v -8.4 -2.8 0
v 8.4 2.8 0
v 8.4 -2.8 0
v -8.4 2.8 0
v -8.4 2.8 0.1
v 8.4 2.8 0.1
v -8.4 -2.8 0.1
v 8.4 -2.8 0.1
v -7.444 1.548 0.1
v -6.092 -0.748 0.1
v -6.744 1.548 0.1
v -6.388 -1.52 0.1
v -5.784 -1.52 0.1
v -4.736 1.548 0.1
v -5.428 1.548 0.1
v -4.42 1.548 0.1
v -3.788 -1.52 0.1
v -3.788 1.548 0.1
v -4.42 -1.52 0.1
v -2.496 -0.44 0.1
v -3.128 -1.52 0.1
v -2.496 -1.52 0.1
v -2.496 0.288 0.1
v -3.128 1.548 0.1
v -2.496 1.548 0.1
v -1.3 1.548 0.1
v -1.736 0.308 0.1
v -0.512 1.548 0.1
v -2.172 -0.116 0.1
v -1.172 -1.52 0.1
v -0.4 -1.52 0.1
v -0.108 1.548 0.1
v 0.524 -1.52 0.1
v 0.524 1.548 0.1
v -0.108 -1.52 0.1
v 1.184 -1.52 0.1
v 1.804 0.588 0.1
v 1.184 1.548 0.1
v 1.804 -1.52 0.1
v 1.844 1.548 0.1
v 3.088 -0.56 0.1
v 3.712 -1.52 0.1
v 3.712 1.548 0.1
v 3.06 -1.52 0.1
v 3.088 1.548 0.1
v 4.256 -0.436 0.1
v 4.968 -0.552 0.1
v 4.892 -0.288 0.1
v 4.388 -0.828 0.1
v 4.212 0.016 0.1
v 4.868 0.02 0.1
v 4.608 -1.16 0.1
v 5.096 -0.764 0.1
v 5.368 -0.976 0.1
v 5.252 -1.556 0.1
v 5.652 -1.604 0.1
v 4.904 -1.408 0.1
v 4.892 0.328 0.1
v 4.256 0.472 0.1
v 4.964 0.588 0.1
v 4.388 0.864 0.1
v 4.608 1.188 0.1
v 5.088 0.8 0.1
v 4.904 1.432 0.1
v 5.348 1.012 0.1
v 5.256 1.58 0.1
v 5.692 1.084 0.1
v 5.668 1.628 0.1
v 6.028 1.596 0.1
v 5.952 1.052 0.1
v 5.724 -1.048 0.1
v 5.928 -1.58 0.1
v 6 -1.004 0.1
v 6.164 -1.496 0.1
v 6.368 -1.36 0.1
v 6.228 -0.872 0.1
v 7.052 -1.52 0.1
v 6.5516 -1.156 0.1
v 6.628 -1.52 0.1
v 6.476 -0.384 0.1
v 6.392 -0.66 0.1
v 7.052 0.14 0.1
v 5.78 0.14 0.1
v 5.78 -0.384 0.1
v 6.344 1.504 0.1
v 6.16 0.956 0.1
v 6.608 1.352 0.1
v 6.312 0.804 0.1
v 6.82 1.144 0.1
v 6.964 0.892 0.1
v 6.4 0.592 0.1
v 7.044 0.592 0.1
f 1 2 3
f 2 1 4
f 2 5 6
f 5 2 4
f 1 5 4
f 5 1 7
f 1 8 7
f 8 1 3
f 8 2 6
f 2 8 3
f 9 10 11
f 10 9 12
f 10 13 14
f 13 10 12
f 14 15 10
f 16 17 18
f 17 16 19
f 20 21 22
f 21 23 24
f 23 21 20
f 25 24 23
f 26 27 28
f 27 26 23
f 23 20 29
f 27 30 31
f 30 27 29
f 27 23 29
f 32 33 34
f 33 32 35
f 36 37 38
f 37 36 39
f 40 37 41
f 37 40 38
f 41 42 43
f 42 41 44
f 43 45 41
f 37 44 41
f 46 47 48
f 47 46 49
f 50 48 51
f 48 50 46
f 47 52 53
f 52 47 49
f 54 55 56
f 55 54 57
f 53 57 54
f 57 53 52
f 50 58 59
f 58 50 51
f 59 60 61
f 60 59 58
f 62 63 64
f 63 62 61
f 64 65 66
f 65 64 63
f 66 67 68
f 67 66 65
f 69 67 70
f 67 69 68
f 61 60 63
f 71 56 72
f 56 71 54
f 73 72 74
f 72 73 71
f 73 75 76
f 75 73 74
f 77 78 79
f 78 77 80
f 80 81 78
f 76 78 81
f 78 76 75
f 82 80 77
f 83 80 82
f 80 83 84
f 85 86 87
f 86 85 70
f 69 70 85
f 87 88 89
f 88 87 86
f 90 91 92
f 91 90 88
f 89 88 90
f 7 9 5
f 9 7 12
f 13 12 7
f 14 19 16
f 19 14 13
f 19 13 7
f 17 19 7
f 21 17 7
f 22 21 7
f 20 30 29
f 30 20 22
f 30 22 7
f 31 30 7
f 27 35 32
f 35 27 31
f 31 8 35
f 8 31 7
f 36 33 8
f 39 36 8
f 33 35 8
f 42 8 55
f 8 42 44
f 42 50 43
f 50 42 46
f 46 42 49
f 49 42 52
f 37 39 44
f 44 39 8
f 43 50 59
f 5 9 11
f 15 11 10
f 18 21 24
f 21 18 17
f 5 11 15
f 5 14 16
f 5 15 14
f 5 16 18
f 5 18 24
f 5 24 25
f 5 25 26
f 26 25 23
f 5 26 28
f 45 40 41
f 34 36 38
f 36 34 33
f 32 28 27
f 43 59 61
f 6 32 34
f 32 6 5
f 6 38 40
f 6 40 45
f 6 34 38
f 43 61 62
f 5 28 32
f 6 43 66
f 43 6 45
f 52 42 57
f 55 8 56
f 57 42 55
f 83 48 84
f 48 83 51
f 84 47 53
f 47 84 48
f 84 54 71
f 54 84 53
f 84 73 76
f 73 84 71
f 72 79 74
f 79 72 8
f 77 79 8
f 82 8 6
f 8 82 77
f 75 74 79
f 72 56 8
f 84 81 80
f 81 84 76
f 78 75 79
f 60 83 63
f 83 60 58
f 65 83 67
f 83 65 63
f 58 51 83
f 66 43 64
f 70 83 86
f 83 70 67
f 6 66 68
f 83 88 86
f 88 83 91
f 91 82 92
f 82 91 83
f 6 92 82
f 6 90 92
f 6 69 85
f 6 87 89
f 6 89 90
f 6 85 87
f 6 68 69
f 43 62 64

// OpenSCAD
// file: ../p/box5-12.scad
use <../lib.scad>
function ldraw_lib__box5_12() = [
// 0 Box with 5 Faces without Any Edges
// 0 Name: box5-12.dat
// 0 Author: Chris Dee [cwdee]
// 0 !LDRAW_ORG Primitive UPDATE 2009-02
// 0 !LICENSE Licensed under CC BY 2.0 and CC BY 4.0 : see CAreadme.txt
// 
// 0 BFC CERTIFY CCW
  [0,"BFC","CERTIFY"],
  [0,"BFC","CCW"],
// 
// 0 !HISTORY 2009-09-03 [PTadmin] Official Update 2009-02
// 
// 
// 4 16 1 1 1 1 1 -1 -1 1 -1 -1 1 1
  [4,16,1,1,1,1,1,-1,-1,1,-1,-1,1,1],
// 4 16 -1 0 1 1 0 1 1 1 1 -1 1 1
  [4,16,-1,0,1,1,0,1,1,1,1,-1,1,1],
// 4 16 -1 0 -1 -1 0 1 -1 1 1 -1 1 -1
  [4,16,-1,0,-1,-1,0,1,-1,1,1,-1,1,-1],
// 4 16 1 0 -1 -1 0 -1 -1 1 -1 1 1 -1
  [4,16,1,0,-1,-1,0,-1,-1,1,-1,1,1,-1],
// 4 16 1 0 1 1 0 -1 1 1 -1 1 1 1
  [4,16,1,0,1,1,0,-1,1,1,-1,1,1,1],
// 0
];
module ldraw_lib__box5_12(step=0, col=false, unit=2/5, alt=false, line=0.2, solid=!$preview)
    makepoly(ldraw_lib__box5_12(), step=step, col=col, unit=unit, alt=alt, line=line, solid=solid);
ldraw_lib__box5_12(line=0.2);
// main file
use <../lib.scad>
use <../p/box5-12.scad>
function ldraw_lib__820672e() = [
// 0 Sticker  0.7 x  2.1 with White "VIKING" on Transparent Background
// 0 Name: 820672e.dat
// 0 Author: Takeshi Takahashi [RainbowDolphin]
// 0 !LDRAW_ORG Part UPDATE 2022-04
// 0 !LICENSE Licensed under CC BY 2.0 and CC BY 4.0 : see CAreadme.txt
// 
// 0 BFC CERTIFY CCW
  [0,"BFC","CERTIFY"],
  [0,"BFC","CCW"],
// 
// 0 !KEYWORDS Crane, harbour, Seaport, Set 6541
// 
// 0 !HISTORY 2022-07-18 [PTadmin] Official Update 2022-04
// 
// 
// 1 16 0 -0.25 0 21 0 0 0 0.25 0 0 0 7 box5-12.dat
  [1,16,0,-0.25,0,21,0,0,0,0.25,0,0,0,7, ldraw_lib__box5_12()],
// 0 BFC NOCLIP
  [0,"BFC","NOCLIP"],
// 4 15 -15.23 -0.25 -1.87 -16.86 -0.25 3.87 -18.61 -0.25 3.87 -15.97 -0.25 -3.8
  [4,15,-15.23,-0.25,-1.87,-16.86,-0.25,3.87,-18.61,-0.25,3.87,-15.97,-0.25,-3.8],
// 4 15 -14.46 -0.25 -3.8 -11.84 -0.25 3.87 -15.23 -0.25 -1.87 -15.97 -0.25 -3.8
  [4,15,-14.46,-0.25,-3.8,-11.84,-0.25,3.87,-15.23,-0.25,-1.87,-15.97,-0.25,-3.8],
// 3 15 -11.84 -0.25 3.87 -13.57 -0.25 3.87 -15.23 -0.25 -1.87
  [3,15,-11.84,-0.25,3.87,-13.57,-0.25,3.87,-15.23,-0.25,-1.87],
// 4 15 -11.05 -0.25 3.87 -11.05 -0.25 -3.8 -9.47 -0.25 -3.8 -9.47 -0.25 3.87
  [4,15,-11.05,-0.25,3.87,-11.05,-0.25,-3.8,-9.47,-0.25,-3.8,-9.47,-0.25,3.87],
// 3 15 -6.24 -0.25 -1.1 -7.82 -0.25 -3.8 -6.24 -0.25 -3.8
  [3,15,-6.24,-0.25,-1.1,-7.82,-0.25,-3.8,-6.24,-0.25,-3.8],
// 4 15 -7.82 -0.25 -3.8 -6.24 -0.25 -1.1 -6.24 -0.25 0.72 -7.82 -0.25 3.87
  [4,15,-7.82,-0.25,-3.8,-6.24,-0.25,-1.1,-6.24,-0.25,0.72,-7.82,-0.25,3.87],
// 3 15 -6.24 -0.25 3.87 -7.82 -0.25 3.87 -6.24 -0.25 0.72
  [3,15,-6.24,-0.25,3.87,-7.82,-0.25,3.87,-6.24,-0.25,0.72],
// 4 15 -3.25 -0.25 3.87 -6.24 -0.25 0.72 -4.34 -0.25 0.77 -1.28 -0.25 3.87
  [4,15,-3.25,-0.25,3.87,-6.24,-0.25,0.72,-4.34,-0.25,0.77,-1.28,-0.25,3.87],
// 3 15 -6.24 -0.25 0.72 -6.24 -0.25 -1.1 -5.43 -0.25 -0.29
  [3,15,-6.24,-0.25,0.72,-6.24,-0.25,-1.1,-5.43,-0.25,-0.29],
// 4 15 -4.34 -0.25 0.77 -5.43 -0.25 -0.29 -2.93 -0.25 -3.8 -1 -0.25 -3.8
  [4,15,-4.34,-0.25,0.77,-5.43,-0.25,-0.29,-2.93,-0.25,-3.8,-1,-0.25,-3.8],
// 3 15 -4.34 -0.25 0.77 -6.24 -0.25 0.72 -5.43 -0.25 -0.29
  [3,15,-4.34,-0.25,0.77,-6.24,-0.25,0.72,-5.43,-0.25,-0.29],
// 4 15 -0.27 -0.25 3.87 -0.27 -0.25 -3.8 1.31 -0.25 -3.8 1.31 -0.25 3.87
  [4,15,-0.27,-0.25,3.87,-0.27,-0.25,-3.8,1.31,-0.25,-3.8,1.31,-0.25,3.87],
// 4 15 2.96 -0.25 -3.8 4.51 -0.25 -3.8 4.51 -0.25 1.47 2.96 -0.25 3.87
  [4,15,2.96,-0.25,-3.8,4.51,-0.25,-3.8,4.51,-0.25,1.47,2.96,-0.25,3.87],
// 4 15 4.61 -0.25 3.87 2.96 -0.25 3.87 4.51 -0.25 1.47 7.72 -0.25 -1.4
  [4,15,4.61,-0.25,3.87,2.96,-0.25,3.87,4.51,-0.25,1.47,7.72,-0.25,-1.4],
// 4 15 7.72 -0.25 -1.4 7.65 -0.25 -3.8 9.28 -0.25 -3.8 9.28 -0.25 3.87
  [4,15,7.72,-0.25,-1.4,7.65,-0.25,-3.8,9.28,-0.25,-3.8,9.28,-0.25,3.87],
// 3 15 9.28 -0.25 3.87 7.72 -0.25 3.87 7.72 -0.25 -1.4
  [3,15,9.28,-0.25,3.87,7.72,-0.25,3.87,7.72,-0.25,-1.4],
// 3 15 4.51 -0.25 1.47 7.65 -0.25 -3.8 7.72 -0.25 -1.4
  [3,15,4.51,-0.25,1.47,7.65,-0.25,-3.8,7.72,-0.25,-1.4],
// 4 15 10.64 -0.25 -1.09 10.97 -0.25 -2.07 12.42 -0.25 -1.38 12.23 -0.25 -0.72
  [4,15,10.64,-0.25,-1.09,10.97,-0.25,-2.07,12.42,-0.25,-1.38,12.23,-0.25,-0.72],
// 4 15 10.53 -0.25 0.04 10.64 -0.25 -1.09 12.23 -0.25 -0.72 12.17 -0.25 0.05
  [4,15,10.53,-0.25,0.04,10.64,-0.25,-1.09,12.23,-0.25,-0.72,12.17,-0.25,0.05],
// 4 15 12.42 -0.25 -1.38 10.97 -0.25 -2.07 11.52 -0.25 -2.9 12.74 -0.25 -1.91
  [4,15,12.42,-0.25,-1.38,10.97,-0.25,-2.07,11.52,-0.25,-2.9,12.74,-0.25,-1.91],
// 4 15 13.42 -0.25 -2.44 12.26 -0.25 -3.52 13.13 -0.25 -3.89 14.13 -0.25 -4.01
  [4,15,13.42,-0.25,-2.44,12.26,-0.25,-3.52,13.13,-0.25,-3.89,14.13,-0.25,-4.01],
// 4 15 12.26 -0.25 -3.52 13.42 -0.25 -2.44 12.74 -0.25 -1.91 11.52 -0.25 -2.9
  [4,15,12.26,-0.25,-3.52,13.42,-0.25,-2.44,12.74,-0.25,-1.91,11.52,-0.25,-2.9],
// 4 15 12.23 -0.25 0.82 10.64 -0.25 1.18 10.53 -0.25 0.04 12.17 -0.25 0.05
  [4,15,12.23,-0.25,0.82,10.64,-0.25,1.18,10.53,-0.25,0.04,12.17,-0.25,0.05],
// 4 15 12.41 -0.25 1.47 10.97 -0.25 2.16 10.64 -0.25 1.18 12.23 -0.25 0.82
  [4,15,12.41,-0.25,1.47,10.97,-0.25,2.16,10.64,-0.25,1.18,12.23,-0.25,0.82],
// 4 15 11.52 -0.25 2.97 10.97 -0.25 2.16 12.72 -0.25 2 12.26 -0.25 3.58
  [4,15,11.52,-0.25,2.97,10.97,-0.25,2.16,12.72,-0.25,2,12.26,-0.25,3.58],
// 4 15 13.37 -0.25 2.53 13.14 -0.25 3.95 12.26 -0.25 3.58 12.72 -0.25 2
  [4,15,13.37,-0.25,2.53,13.14,-0.25,3.95,12.26,-0.25,3.58,12.72,-0.25,2],
// 4 15 14.23 -0.25 2.71 14.17 -0.25 4.07 13.14 -0.25 3.95 13.37 -0.25 2.53
  [4,15,14.23,-0.25,2.71,14.17,-0.25,4.07,13.14,-0.25,3.95,13.37,-0.25,2.53],
// 4 15 15.07 -0.25 3.99 14.17 -0.25 4.07 14.23 -0.25 2.71 14.88 -0.25 2.63
  [4,15,15.07,-0.25,3.99,14.17,-0.25,4.07,14.23,-0.25,2.71,14.88,-0.25,2.63],
// 3 15 10.97 -0.25 2.16 12.41 -0.25 1.47 12.72 -0.25 2
  [3,15,10.97,-0.25,2.16,12.41,-0.25,1.47,12.72,-0.25,2],
// 4 15 14.31 -0.25 -2.62 13.42 -0.25 -2.44 14.13 -0.25 -4.01 14.82 -0.25 -3.95
  [4,15,14.31,-0.25,-2.62,13.42,-0.25,-2.44,14.13,-0.25,-4.01,14.82,-0.25,-3.95],
// 4 15 15 -0.25 -2.51 14.31 -0.25 -2.62 14.82 -0.25 -3.95 15.41 -0.25 -3.74
  [4,15,15,-0.25,-2.51,14.31,-0.25,-2.62,14.82,-0.25,-3.95,15.41,-0.25,-3.74],
// 4 15 15.92 -0.25 -3.4 15.57 -0.25 -2.18 15 -0.25 -2.51 15.41 -0.25 -3.74
  [4,15,15.92,-0.25,-3.4,15.57,-0.25,-2.18,15,-0.25,-2.51,15.41,-0.25,-3.74],
// 4 15 16.379 -0.25 -2.89 16.57 -0.25 -3.8 17.63 -0.25 -3.8 16.19 -0.25 -0.96
  [4,15,16.379,-0.25,-2.89,16.57,-0.25,-3.8,17.63,-0.25,-3.8,16.19,-0.25,-0.96],
// 3 15 16.19 -0.25 -0.96 15.98 -0.25 -1.65 16.379 -0.25 -2.89
  [3,15,16.19,-0.25,-0.96,15.98,-0.25,-1.65,16.379,-0.25,-2.89],
// 4 15 16.379 -0.25 -2.89 15.98 -0.25 -1.65 15.57 -0.25 -2.18 15.92 -0.25 -3.4
  [4,15,16.379,-0.25,-2.89,15.98,-0.25,-1.65,15.57,-0.25,-2.18,15.92,-0.25,-3.4],
// 3 15 17.63 -0.25 0.35 16.19 -0.25 -0.96 17.63 -0.25 -3.8
  [3,15,17.63,-0.25,0.35,16.19,-0.25,-0.96,17.63,-0.25,-3.8],
// 4 15 14.45 -0.25 0.35 14.45 -0.25 -0.96 16.19 -0.25 -0.96 17.63 -0.25 0.35
  [4,15,14.45,-0.25,0.35,14.45,-0.25,-0.96,16.19,-0.25,-0.96,17.63,-0.25,0.35],
// 4 15 15.4 -0.25 2.39 16.52 -0.25 3.38 15.86 -0.25 3.76 14.88 -0.25 2.63
  [4,15,15.4,-0.25,2.39,16.52,-0.25,3.38,15.86,-0.25,3.76,14.88,-0.25,2.63],
// 3 15 15.07 -0.25 3.99 14.88 -0.25 2.63 15.86 -0.25 3.76
  [3,15,15.07,-0.25,3.99,14.88,-0.25,2.63,15.86,-0.25,3.76],
// 4 15 16.52 -.25 3.38 15.4 -.25 2.39 15.78 -.25 2.01 17.05 -.25 2.86
  [4,15,16.52,-.25,3.38,15.4,-.25,2.39,15.78,-.25,2.01,17.05,-.25,2.86],
// 4 15 16 -.25 1.48 17.61 -.25 1.48 17.41 -.25 2.23 15.78 -.25 2.01
  [4,15,16,-.25,1.48,17.61,-.25,1.48,17.41,-.25,2.23,15.78,-.25,2.01],
// 3 15 17.05 -.25 2.86 15.78 -.25 2.01 17.41 -.25 2.23
  [3,15,17.05,-.25,2.86,15.78,-.25,2.01,17.41,-.25,2.23],
// 0 BFC CLIP
  [0,"BFC","CLIP"],
// 4 16 -21 -0.25 -7 -15.97 -0.25 -3.8 -18.61 -0.25 3.87 -21 -0.25 7
  [4,16,-21,-0.25,-7,-15.97,-0.25,-3.8,-18.61,-0.25,3.87,-21,-0.25,7],
// 3 16 -14.46 -0.25 -3.8 -15.97 -0.25 -3.8 -21 -0.25 -7
  [3,16,-14.46,-0.25,-3.8,-15.97,-0.25,-3.8,-21,-0.25,-7],
// 4 16 -11.84 -0.25 3.87 -14.46 -0.25 -3.8 -11.05 -0.25 -3.8 -11.05 -0.25 3.87
  [4,16,-11.84,-0.25,3.87,-14.46,-0.25,-3.8,-11.05,-0.25,-3.8,-11.05,-0.25,3.87],
// 3 16 -11.05 -0.25 -3.8 -14.46 -0.25 -3.8 -21 -0.25 -7
  [3,16,-11.05,-0.25,-3.8,-14.46,-0.25,-3.8,-21,-0.25,-7],
// 3 16 -9.47 -0.25 -3.8 -11.05 -0.25 -3.8 -21 -0.25 -7
  [3,16,-9.47,-0.25,-3.8,-11.05,-0.25,-3.8,-21,-0.25,-7],
// 3 16 -7.82 -0.25 -3.8 -9.47 -0.25 -3.8 -21 -0.25 -7
  [3,16,-7.82,-0.25,-3.8,-9.47,-0.25,-3.8,-21,-0.25,-7],
// 3 16 -6.24 -0.25 -3.8 -7.82 -0.25 -3.8 -21 -0.25 -7
  [3,16,-6.24,-0.25,-3.8,-7.82,-0.25,-3.8,-21,-0.25,-7],
// 4 16 -2.93 -0.25 -3.8 -5.43 -0.25 -0.29 -6.24 -0.25 -1.1 -6.24 -0.25 -3.8
  [4,16,-2.93,-0.25,-3.8,-5.43,-0.25,-0.29,-6.24,-0.25,-1.1,-6.24,-0.25,-3.8],
// 3 16 -2.93 -0.25 -3.8 -6.24 -0.25 -3.8 -21 -0.25 -7
  [3,16,-2.93,-0.25,-3.8,-6.24,-0.25,-3.8,-21,-0.25,-7],
// 3 16 -1 -0.25 -3.8 -2.93 -0.25 -3.8 -21 -0.25 -7
  [3,16,-1,-0.25,-3.8,-2.93,-0.25,-3.8,-21,-0.25,-7],
// 4 16 -4.34 -0.25 0.77 -1 -0.25 -3.8 -0.27 -0.25 -3.8 -0.27 -0.25 3.87
  [4,16,-4.34,-0.25,0.77,-1,-0.25,-3.8,-0.27,-0.25,-3.8,-0.27,-0.25,3.87],
// 4 16 -0.27 -0.25 -3.8 -1 -0.25 -3.8 -21 -0.25 -7 21 -0.25 -7
  [4,16,-0.27,-0.25,-3.8,-1,-0.25,-3.8,-21,-0.25,-7,21,-0.25,-7],
// 3 16 2.96 -0.25 -3.8 1.31 -0.25 -3.8 21 -0.25 -7
  [3,16,2.96,-0.25,-3.8,1.31,-0.25,-3.8,21,-0.25,-7],
// 3 16 4.51 -0.25 -3.8 2.96 -0.25 -3.8 21 -0.25 -7
  [3,16,4.51,-0.25,-3.8,2.96,-0.25,-3.8,21,-0.25,-7],
// 3 16 1.31 -0.25 -3.8 -0.27 -0.25 -3.8 21 -0.25 -7
  [3,16,1.31,-0.25,-3.8,-0.27,-0.25,-3.8,21,-0.25,-7],
// 4 16 9.28 -0.25 -3.8 7.65 -0.25 -3.8 21 -0.25 -7 13.13 -0.25 -3.89
  [4,16,9.28,-0.25,-3.8,7.65,-0.25,-3.8,21,-0.25,-7,13.13,-0.25,-3.89],
// 4 16 9.28 -0.25 -3.8 10.64 -0.25 -1.09 10.53 -0.25 0.04 9.28 -0.25 3.87
  [4,16,9.28,-0.25,-3.8,10.64,-0.25,-1.09,10.53,-0.25,0.04,9.28,-0.25,3.87],
// 3 16 10.64 -0.25 -1.09 9.28 -0.25 -3.8 10.97 -0.25 -2.07
  [3,16,10.64,-0.25,-1.09,9.28,-0.25,-3.8,10.97,-0.25,-2.07],
// 3 16 10.97 -0.25 -2.07 9.28 -0.25 -3.8 11.52 -0.25 -2.9
  [3,16,10.97,-0.25,-2.07,9.28,-0.25,-3.8,11.52,-0.25,-2.9],
// 3 16 4.51 -0.25 1.47 4.51 -0.25 -3.8 7.65 -0.25 -3.8
  [3,16,4.51,-0.25,1.47,4.51,-0.25,-3.8,7.65,-0.25,-3.8],
// 3 16 7.65 -0.25 -3.8 4.51 -0.25 -3.8 21 -0.25 -7
  [3,16,7.65,-0.25,-3.8,4.51,-0.25,-3.8,21,-0.25,-7],
// 3 16 9.28 -0.25 3.87 10.53 -0.25 0.04 10.64 -0.25 1.18
  [3,16,9.28,-0.25,3.87,10.53,-0.25,0.04,10.64,-0.25,1.18],
// 3 16 -21 -0.25 7 -18.61 -0.25 3.87 -16.86 -0.25 3.87
  [3,16,-21,-0.25,7,-18.61,-0.25,3.87,-16.86,-0.25,3.87],
// 3 16 -13.57 -0.25 3.87 -16.86 -0.25 3.87 -15.23 -0.25 -1.87
  [3,16,-13.57,-0.25,3.87,-16.86,-0.25,3.87,-15.23,-0.25,-1.87],
// 4 16 -9.47 -0.25 3.87 -9.47 -0.25 -3.8 -7.82 -0.25 -3.8 -7.82 -0.25 3.87
  [4,16,-9.47,-0.25,3.87,-9.47,-0.25,-3.8,-7.82,-0.25,-3.8,-7.82,-0.25,3.87],
// 3 16 -21 -0.25 7 -16.86 -0.25 3.87 -13.57 -0.25 3.87
  [3,16,-21,-0.25,7,-16.86,-0.25,3.87,-13.57,-0.25,3.87],
// 3 16 -21 -0.25 7 -11.84 -0.25 3.87 -11.05 -0.25 3.87
  [3,16,-21,-0.25,7,-11.84,-0.25,3.87,-11.05,-0.25,3.87],
// 3 16 -21 -0.25 7 -13.57 -0.25 3.87 -11.84 -0.25 3.87
  [3,16,-21,-0.25,7,-13.57,-0.25,3.87,-11.84,-0.25,3.87],
// 3 16 -21 -0.25 7 -11.05 -0.25 3.87 -9.47 -0.25 3.87
  [3,16,-21,-0.25,7,-11.05,-0.25,3.87,-9.47,-0.25,3.87],
// 3 16 -21 -0.25 7 -9.47 -0.25 3.87 -7.82 -0.25 3.87
  [3,16,-21,-0.25,7,-9.47,-0.25,3.87,-7.82,-0.25,3.87],
// 3 16 -21 -0.25 7 -7.82 -0.25 3.87 -6.24 -0.25 3.87
  [3,16,-21,-0.25,7,-7.82,-0.25,3.87,-6.24,-0.25,3.87],
// 3 16 -21 -0.25 7 -6.24 -0.25 3.87 -3.25 -0.25 3.87
  [3,16,-21,-0.25,7,-6.24,-0.25,3.87,-3.25,-0.25,3.87],
// 3 16 -3.25 -0.25 3.87 -6.24 -0.25 3.87 -6.24 -0.25 0.72
  [3,16,-3.25,-0.25,3.87,-6.24,-0.25,3.87,-6.24,-0.25,0.72],
// 3 16 -21 -0.25 7 -3.25 -0.25 3.87 -1.28 -0.25 3.87
  [3,16,-21,-0.25,7,-3.25,-0.25,3.87,-1.28,-0.25,3.87],
// 3 16 7.72 -0.25 3.87 4.61 -0.25 3.87 7.72 -0.25 -1.4
  [3,16,7.72,-0.25,3.87,4.61,-0.25,3.87,7.72,-0.25,-1.4],
// 4 16 1.31 -0.25 3.87 1.31 -0.25 -3.8 2.96 -0.25 -3.8 2.96 -0.25 3.87
  [4,16,1.31,-0.25,3.87,1.31,-0.25,-3.8,2.96,-0.25,-3.8,2.96,-0.25,3.87],
// 3 16 -0.27 -0.25 3.87 -1.28 -0.25 3.87 -4.34 -0.25 0.77
  [3,16,-0.27,-0.25,3.87,-1.28,-0.25,3.87,-4.34,-0.25,0.77],
// 3 16 9.28 -0.25 3.87 10.64 -0.25 1.18 10.97 -0.25 2.16
  [3,16,9.28,-0.25,3.87,10.64,-0.25,1.18,10.97,-0.25,2.16],
// 4 16 21 -0.25 7 -21 -0.25 7 -0.27 -0.25 3.87 1.31 -0.25 3.87
  [4,16,21,-0.25,7,-21,-0.25,7,-0.27,-0.25,3.87,1.31,-0.25,3.87],
// 3 16 21 -0.25 7 2.96 -0.25 3.87 4.61 -0.25 3.87
  [3,16,21,-0.25,7,2.96,-0.25,3.87,4.61,-0.25,3.87],
// 3 16 21 -0.25 7 4.61 -0.25 3.87 7.72 -0.25 3.87
  [3,16,21,-0.25,7,4.61,-0.25,3.87,7.72,-0.25,3.87],
// 3 16 21 -0.25 7 1.31 -0.25 3.87 2.96 -0.25 3.87
  [3,16,21,-0.25,7,1.31,-0.25,3.87,2.96,-0.25,3.87],
// 3 16 9.28 -0.25 3.87 10.97 -0.25 2.16 11.52 -0.25 2.97
  [3,16,9.28,-0.25,3.87,10.97,-0.25,2.16,11.52,-0.25,2.97],
// 3 16 -21 -0.25 7 -1.28 -0.25 3.87 -0.27 -0.25 3.87
  [3,16,-21,-0.25,7,-1.28,-0.25,3.87,-0.27,-0.25,3.87],
// 4 16 21 -0.25 7 7.72 -0.25 3.87 9.28 -0.25 3.87 13.14 -0.25 3.95
  [4,16,21,-0.25,7,7.72,-0.25,3.87,9.28,-0.25,3.87,13.14,-0.25,3.95],
// 3 16 11.52 -0.25 -2.9 9.28 -0.25 -3.8 12.26 -0.25 -3.52
  [3,16,11.52,-0.25,-2.9,9.28,-0.25,-3.8,12.26,-0.25,-3.52],
// 3 16 13.13 -0.25 -3.89 21 -0.25 -7 14.13 -0.25 -4.01
  [3,16,13.13,-0.25,-3.89,21,-0.25,-7,14.13,-0.25,-4.01],
// 3 16 12.26 -0.25 -3.52 9.28 -0.25 -3.8 13.13 -0.25 -3.89
  [3,16,12.26,-0.25,-3.52,9.28,-0.25,-3.8,13.13,-0.25,-3.89],
// 4 16 14.45 -0.25 0.35 12.17 -0.25 0.05 12.23 -0.25 -0.72 14.45 -0.25 -0.96
  [4,16,14.45,-0.25,0.35,12.17,-0.25,0.05,12.23,-0.25,-0.72,14.45,-0.25,-0.96],
// 4 16 14.45 -0.25 -0.96 12.23 -0.25 -0.72 12.42 -0.25 -1.38 12.74 -0.25 -1.91
  [4,16,14.45,-0.25,-0.96,12.23,-0.25,-0.72,12.42,-0.25,-1.38,12.74,-0.25,-1.91],
// 4 16 14.45 -0.25 -0.96 12.74 -0.25 -1.91 13.42 -0.25 -2.44 14.31 -0.25 -2.62
  [4,16,14.45,-0.25,-0.96,12.74,-0.25,-1.91,13.42,-0.25,-2.44,14.31,-0.25,-2.62],
// 4 16 14.45 -0.25 -0.96 14.31 -0.25 -2.62 15 -0.25 -2.51 15.57 -0.25 -2.18
  [4,16,14.45,-0.25,-0.96,14.31,-0.25,-2.62,15,-0.25,-2.51,15.57,-0.25,-2.18],
// 4 16 16.57 -0.25 -3.8 15.41 -0.25 -3.74 14.82 -0.25 -3.95 21 -0.25 -7
  [4,16,16.57,-0.25,-3.8,15.41,-0.25,-3.74,14.82,-0.25,-3.95,21,-0.25,-7],
// 3 16 17.63 -0.25 -3.8 16.57 -0.25 -3.8 21 -0.25 -7
  [3,16,17.63,-0.25,-3.8,16.57,-0.25,-3.8,21,-0.25,-7],
// 4 16 17.63 -0.25 0.35 17.63 -0.25 -3.8 21 -0.25 -7 21 -0.25 7
  [4,16,17.63,-0.25,0.35,17.63,-0.25,-3.8,21,-0.25,-7,21,-0.25,7],
// 3 16 15.92 -0.25 -3.4 15.41 -0.25 -3.74 16.57 -0.25 -3.8
  [3,16,15.92,-0.25,-3.4,15.41,-0.25,-3.74,16.57,-0.25,-3.8],
// 3 16 14.82 -0.25 -3.95 14.13 -0.25 -4.01 21 -0.25 -7
  [3,16,14.82,-0.25,-3.95,14.13,-0.25,-4.01,21,-0.25,-7],
// 4 16 14.45 -0.25 -0.96 15.57 -0.25 -2.18 15.98 -0.25 -1.65 16.19 -0.25 -0.96
  [4,16,14.45,-0.25,-0.96,15.57,-0.25,-2.18,15.98,-0.25,-1.65,16.19,-0.25,-0.96],
// 3 16 16.379 -0.25 -2.89 15.92 -0.25 -3.4 16.57 -0.25 -3.8
  [3,16,16.379,-0.25,-2.89,15.92,-0.25,-3.4,16.57,-0.25,-3.8],
// 4 16 12.41 -0.25 1.47 12.23 -0.25 0.82 14.45 -0.25 0.35 12.72 -0.25 2
  [4,16,12.41,-0.25,1.47,12.23,-0.25,0.82,14.45,-0.25,0.35,12.72,-0.25,2],
// 4 16 13.37 -0.25 2.53 12.72 -0.25 2 14.45 -0.25 0.35 14.23 -0.25 2.71
  [4,16,13.37,-0.25,2.53,12.72,-0.25,2,14.45,-0.25,0.35,14.23,-0.25,2.71],
// 3 16 12.23 -0.25 0.82 12.17 -0.25 0.05 14.45 -0.25 0.35
  [3,16,12.23,-0.25,0.82,12.17,-0.25,0.05,14.45,-0.25,0.35],
// 3 16 13.14 -0.25 3.95 9.28 -0.25 3.87 12.26 -0.25 3.58
  [3,16,13.14,-0.25,3.95,9.28,-0.25,3.87,12.26,-0.25,3.58],
// 4 16 14.88 -0.25 2.63 14.23 -0.25 2.71 14.45 -0.25 0.35 15.4 -0.25 2.39
  [4,16,14.88,-0.25,2.63,14.23,-0.25,2.71,14.45,-0.25,0.35,15.4,-0.25,2.39],
// 3 16 21 -0.25 7 13.14 -0.25 3.95 14.17 -0.25 4.07
  [3,16,21,-0.25,7,13.14,-0.25,3.95,14.17,-0.25,4.07],
// 4 16 15.78 -.25 2.01 15.4 -.25 2.39 14.45 -.25 .35 16 -.25 1.48
  [4,16,15.78,-.25,2.01,15.4,-.25,2.39,14.45,-.25,.35,16,-.25,1.48],
// 4 16 17.63 -0.25 0.35 17.61 -0.25 1.48 16 -0.25 1.48 14.45 -0.25 0.35
  [4,16,17.63,-0.25,0.35,17.61,-0.25,1.48,16,-0.25,1.48,14.45,-0.25,0.35],
// 3 16 21 -0.25 7 17.61 -0.25 1.48 17.63 -0.25 0.35
  [3,16,21,-0.25,7,17.61,-0.25,1.48,17.63,-0.25,0.35],
// 3 16 21 -0.25 7 17.41 -0.25 2.23 17.61 -0.25 1.48
  [3,16,21,-0.25,7,17.41,-0.25,2.23,17.61,-0.25,1.48],
// 3 16 21 -0.25 7 15.07 -0.25 3.99 15.86 -0.25 3.76
  [3,16,21,-0.25,7,15.07,-0.25,3.99,15.86,-0.25,3.76],
// 3 16 21 -0.25 7 16.52 -0.25 3.38 17.05 -0.25 2.86
  [3,16,21,-0.25,7,16.52,-0.25,3.38,17.05,-0.25,2.86],
// 3 16 21 -0.25 7 17.05 -0.25 2.86 17.41 -0.25 2.23
  [3,16,21,-0.25,7,17.05,-0.25,2.86,17.41,-0.25,2.23],
// 3 16 21 -0.25 7 15.86 -0.25 3.76 16.52 -0.25 3.38
  [3,16,21,-0.25,7,15.86,-0.25,3.76,16.52,-0.25,3.38],
// 3 16 21 -0.25 7 14.17 -0.25 4.07 15.07 -0.25 3.99
  [3,16,21,-0.25,7,14.17,-0.25,4.07,15.07,-0.25,3.99],
// 3 16 9.28 -0.25 3.87 11.52 -0.25 2.97 12.26 -0.25 3.58
  [3,16,9.28,-0.25,3.87,11.52,-0.25,2.97,12.26,-0.25,3.58],
];
module ldraw_lib__820672e(step=0, col=false, unit=2/5, alt=false, line=0.2, solid=!$preview)
    makepoly(ldraw_lib__820672e(), step=step, col=col, unit=unit, alt=alt, line=line, solid=solid);
ldraw_lib__820672e(line=0.2);
